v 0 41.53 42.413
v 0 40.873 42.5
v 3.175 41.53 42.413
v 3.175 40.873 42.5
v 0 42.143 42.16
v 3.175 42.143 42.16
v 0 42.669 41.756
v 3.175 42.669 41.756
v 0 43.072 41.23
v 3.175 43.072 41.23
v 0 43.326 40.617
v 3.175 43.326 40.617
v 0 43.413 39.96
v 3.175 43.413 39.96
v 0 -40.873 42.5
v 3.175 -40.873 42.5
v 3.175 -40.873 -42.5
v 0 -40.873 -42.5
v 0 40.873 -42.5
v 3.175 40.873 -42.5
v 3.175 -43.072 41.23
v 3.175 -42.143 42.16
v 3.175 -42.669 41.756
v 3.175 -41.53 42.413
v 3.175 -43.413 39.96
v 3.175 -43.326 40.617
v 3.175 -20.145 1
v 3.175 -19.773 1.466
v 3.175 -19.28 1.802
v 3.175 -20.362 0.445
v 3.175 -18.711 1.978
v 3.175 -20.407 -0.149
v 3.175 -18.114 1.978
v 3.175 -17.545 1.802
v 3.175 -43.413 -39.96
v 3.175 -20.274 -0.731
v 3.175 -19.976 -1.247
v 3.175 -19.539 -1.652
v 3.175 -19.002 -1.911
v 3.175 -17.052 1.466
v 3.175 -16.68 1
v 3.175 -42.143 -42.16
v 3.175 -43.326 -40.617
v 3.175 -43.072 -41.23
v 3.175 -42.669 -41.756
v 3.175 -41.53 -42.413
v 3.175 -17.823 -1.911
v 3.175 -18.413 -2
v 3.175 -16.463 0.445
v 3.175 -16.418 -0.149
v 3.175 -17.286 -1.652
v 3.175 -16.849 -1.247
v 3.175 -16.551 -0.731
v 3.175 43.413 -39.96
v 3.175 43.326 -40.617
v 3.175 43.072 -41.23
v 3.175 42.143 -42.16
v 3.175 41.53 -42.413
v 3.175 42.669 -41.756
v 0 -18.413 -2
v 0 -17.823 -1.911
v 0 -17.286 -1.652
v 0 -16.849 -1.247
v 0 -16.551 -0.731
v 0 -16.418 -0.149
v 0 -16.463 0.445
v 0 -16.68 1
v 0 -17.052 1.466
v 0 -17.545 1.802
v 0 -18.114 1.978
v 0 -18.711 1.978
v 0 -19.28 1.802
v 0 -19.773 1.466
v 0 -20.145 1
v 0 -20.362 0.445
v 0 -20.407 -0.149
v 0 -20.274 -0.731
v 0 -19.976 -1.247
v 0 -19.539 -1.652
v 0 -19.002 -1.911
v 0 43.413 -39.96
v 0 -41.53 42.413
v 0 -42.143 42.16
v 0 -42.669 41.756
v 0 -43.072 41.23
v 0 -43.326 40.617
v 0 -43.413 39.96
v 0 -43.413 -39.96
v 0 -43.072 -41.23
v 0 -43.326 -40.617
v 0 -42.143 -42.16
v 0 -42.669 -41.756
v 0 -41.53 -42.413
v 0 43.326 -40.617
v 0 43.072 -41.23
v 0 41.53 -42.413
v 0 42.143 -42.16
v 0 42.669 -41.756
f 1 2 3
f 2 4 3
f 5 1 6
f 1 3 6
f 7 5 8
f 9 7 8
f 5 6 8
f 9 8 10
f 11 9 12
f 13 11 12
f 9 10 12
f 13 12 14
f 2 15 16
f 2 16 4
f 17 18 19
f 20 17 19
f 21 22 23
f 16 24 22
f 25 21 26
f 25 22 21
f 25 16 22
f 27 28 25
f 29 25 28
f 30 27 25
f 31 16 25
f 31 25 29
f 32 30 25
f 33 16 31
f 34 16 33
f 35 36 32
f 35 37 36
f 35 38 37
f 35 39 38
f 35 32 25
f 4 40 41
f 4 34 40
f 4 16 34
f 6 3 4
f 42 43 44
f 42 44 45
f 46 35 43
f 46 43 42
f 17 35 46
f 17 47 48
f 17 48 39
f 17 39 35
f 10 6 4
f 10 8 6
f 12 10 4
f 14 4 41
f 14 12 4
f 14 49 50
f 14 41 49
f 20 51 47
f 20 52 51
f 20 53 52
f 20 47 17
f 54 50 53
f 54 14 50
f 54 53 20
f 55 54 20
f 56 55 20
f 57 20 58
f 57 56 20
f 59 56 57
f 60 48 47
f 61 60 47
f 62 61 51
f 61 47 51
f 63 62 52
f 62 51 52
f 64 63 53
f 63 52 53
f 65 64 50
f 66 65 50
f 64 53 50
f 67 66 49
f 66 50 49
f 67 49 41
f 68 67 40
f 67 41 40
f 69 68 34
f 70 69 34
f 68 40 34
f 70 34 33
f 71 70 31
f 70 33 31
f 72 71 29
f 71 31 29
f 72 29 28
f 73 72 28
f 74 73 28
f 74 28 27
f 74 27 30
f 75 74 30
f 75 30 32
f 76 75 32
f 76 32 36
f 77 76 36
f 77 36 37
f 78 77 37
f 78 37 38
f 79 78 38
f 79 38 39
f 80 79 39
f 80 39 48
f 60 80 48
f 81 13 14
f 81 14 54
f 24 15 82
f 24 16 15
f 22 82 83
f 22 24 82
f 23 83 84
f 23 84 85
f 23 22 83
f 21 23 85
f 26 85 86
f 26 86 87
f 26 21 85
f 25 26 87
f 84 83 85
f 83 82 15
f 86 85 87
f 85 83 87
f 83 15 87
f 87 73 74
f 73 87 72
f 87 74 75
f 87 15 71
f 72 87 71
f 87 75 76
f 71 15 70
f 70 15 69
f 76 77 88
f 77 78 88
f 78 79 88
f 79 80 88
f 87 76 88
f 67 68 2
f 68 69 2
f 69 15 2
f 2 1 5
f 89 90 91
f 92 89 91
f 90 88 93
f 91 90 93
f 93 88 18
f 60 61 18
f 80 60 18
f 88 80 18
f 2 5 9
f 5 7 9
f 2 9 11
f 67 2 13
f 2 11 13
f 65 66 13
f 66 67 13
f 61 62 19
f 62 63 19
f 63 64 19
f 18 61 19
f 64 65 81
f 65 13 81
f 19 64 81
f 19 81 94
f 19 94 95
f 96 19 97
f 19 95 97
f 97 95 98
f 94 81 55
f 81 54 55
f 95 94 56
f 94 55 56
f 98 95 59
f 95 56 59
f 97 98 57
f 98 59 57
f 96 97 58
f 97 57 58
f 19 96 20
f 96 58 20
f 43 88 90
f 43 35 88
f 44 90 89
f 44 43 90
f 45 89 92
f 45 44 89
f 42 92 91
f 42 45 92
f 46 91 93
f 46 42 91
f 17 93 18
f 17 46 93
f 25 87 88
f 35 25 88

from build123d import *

# Parameters (mm, degrees)
SKETCH1_W           = 84.999999926
SKETCH1_H           = 86.825000086
BOSS_EXTRUDE1_DEPTH = 3.175
SKETCH2_R           = 2
CUT_EXTRUDE1_DEPTH  = 61.835645652
FILLET1_R           = 2.54


with BuildPart() as part:
    # Sketch1 → Boss-Extrude1 (new body)
    with BuildSketch(Plane(origin=(0, 0, 0), x_dir=(0, 0, -1), z_dir=(1, 0, 0))):
        Rectangle(SKETCH1_W, SKETCH1_H)
    extrude(amount=BOSS_EXTRUDE1_DEPTH)

    # Sketch2 → Cut-Extrude1 (cut, through all)
    with BuildSketch(Plane(origin=(3.175, 0, 0), x_dir=(0, 0, -1), z_dir=(1, 0, 0))):
        with Locations((3.7e-08, -18.412500043)):
            Circle(SKETCH2_R)
    extrude(amount=-CUT_EXTRUDE1_DEPTH, mode=Mode.SUBTRACT)

    # Fillet1
    fillet1_edges = [part.edges().sort_by_distance(p)[0] for p in [
        (1.5875, 43.412500043, 42.499999963),
        (1.5875, 43.412500043, -42.499999963),
        (1.5875, -43.412500043, -42.499999963),
        (1.5875, -43.412500043, 42.499999963),
    ]]
    fillet(fillet1_edges, radius=FILLET1_R)


solid = part.part
